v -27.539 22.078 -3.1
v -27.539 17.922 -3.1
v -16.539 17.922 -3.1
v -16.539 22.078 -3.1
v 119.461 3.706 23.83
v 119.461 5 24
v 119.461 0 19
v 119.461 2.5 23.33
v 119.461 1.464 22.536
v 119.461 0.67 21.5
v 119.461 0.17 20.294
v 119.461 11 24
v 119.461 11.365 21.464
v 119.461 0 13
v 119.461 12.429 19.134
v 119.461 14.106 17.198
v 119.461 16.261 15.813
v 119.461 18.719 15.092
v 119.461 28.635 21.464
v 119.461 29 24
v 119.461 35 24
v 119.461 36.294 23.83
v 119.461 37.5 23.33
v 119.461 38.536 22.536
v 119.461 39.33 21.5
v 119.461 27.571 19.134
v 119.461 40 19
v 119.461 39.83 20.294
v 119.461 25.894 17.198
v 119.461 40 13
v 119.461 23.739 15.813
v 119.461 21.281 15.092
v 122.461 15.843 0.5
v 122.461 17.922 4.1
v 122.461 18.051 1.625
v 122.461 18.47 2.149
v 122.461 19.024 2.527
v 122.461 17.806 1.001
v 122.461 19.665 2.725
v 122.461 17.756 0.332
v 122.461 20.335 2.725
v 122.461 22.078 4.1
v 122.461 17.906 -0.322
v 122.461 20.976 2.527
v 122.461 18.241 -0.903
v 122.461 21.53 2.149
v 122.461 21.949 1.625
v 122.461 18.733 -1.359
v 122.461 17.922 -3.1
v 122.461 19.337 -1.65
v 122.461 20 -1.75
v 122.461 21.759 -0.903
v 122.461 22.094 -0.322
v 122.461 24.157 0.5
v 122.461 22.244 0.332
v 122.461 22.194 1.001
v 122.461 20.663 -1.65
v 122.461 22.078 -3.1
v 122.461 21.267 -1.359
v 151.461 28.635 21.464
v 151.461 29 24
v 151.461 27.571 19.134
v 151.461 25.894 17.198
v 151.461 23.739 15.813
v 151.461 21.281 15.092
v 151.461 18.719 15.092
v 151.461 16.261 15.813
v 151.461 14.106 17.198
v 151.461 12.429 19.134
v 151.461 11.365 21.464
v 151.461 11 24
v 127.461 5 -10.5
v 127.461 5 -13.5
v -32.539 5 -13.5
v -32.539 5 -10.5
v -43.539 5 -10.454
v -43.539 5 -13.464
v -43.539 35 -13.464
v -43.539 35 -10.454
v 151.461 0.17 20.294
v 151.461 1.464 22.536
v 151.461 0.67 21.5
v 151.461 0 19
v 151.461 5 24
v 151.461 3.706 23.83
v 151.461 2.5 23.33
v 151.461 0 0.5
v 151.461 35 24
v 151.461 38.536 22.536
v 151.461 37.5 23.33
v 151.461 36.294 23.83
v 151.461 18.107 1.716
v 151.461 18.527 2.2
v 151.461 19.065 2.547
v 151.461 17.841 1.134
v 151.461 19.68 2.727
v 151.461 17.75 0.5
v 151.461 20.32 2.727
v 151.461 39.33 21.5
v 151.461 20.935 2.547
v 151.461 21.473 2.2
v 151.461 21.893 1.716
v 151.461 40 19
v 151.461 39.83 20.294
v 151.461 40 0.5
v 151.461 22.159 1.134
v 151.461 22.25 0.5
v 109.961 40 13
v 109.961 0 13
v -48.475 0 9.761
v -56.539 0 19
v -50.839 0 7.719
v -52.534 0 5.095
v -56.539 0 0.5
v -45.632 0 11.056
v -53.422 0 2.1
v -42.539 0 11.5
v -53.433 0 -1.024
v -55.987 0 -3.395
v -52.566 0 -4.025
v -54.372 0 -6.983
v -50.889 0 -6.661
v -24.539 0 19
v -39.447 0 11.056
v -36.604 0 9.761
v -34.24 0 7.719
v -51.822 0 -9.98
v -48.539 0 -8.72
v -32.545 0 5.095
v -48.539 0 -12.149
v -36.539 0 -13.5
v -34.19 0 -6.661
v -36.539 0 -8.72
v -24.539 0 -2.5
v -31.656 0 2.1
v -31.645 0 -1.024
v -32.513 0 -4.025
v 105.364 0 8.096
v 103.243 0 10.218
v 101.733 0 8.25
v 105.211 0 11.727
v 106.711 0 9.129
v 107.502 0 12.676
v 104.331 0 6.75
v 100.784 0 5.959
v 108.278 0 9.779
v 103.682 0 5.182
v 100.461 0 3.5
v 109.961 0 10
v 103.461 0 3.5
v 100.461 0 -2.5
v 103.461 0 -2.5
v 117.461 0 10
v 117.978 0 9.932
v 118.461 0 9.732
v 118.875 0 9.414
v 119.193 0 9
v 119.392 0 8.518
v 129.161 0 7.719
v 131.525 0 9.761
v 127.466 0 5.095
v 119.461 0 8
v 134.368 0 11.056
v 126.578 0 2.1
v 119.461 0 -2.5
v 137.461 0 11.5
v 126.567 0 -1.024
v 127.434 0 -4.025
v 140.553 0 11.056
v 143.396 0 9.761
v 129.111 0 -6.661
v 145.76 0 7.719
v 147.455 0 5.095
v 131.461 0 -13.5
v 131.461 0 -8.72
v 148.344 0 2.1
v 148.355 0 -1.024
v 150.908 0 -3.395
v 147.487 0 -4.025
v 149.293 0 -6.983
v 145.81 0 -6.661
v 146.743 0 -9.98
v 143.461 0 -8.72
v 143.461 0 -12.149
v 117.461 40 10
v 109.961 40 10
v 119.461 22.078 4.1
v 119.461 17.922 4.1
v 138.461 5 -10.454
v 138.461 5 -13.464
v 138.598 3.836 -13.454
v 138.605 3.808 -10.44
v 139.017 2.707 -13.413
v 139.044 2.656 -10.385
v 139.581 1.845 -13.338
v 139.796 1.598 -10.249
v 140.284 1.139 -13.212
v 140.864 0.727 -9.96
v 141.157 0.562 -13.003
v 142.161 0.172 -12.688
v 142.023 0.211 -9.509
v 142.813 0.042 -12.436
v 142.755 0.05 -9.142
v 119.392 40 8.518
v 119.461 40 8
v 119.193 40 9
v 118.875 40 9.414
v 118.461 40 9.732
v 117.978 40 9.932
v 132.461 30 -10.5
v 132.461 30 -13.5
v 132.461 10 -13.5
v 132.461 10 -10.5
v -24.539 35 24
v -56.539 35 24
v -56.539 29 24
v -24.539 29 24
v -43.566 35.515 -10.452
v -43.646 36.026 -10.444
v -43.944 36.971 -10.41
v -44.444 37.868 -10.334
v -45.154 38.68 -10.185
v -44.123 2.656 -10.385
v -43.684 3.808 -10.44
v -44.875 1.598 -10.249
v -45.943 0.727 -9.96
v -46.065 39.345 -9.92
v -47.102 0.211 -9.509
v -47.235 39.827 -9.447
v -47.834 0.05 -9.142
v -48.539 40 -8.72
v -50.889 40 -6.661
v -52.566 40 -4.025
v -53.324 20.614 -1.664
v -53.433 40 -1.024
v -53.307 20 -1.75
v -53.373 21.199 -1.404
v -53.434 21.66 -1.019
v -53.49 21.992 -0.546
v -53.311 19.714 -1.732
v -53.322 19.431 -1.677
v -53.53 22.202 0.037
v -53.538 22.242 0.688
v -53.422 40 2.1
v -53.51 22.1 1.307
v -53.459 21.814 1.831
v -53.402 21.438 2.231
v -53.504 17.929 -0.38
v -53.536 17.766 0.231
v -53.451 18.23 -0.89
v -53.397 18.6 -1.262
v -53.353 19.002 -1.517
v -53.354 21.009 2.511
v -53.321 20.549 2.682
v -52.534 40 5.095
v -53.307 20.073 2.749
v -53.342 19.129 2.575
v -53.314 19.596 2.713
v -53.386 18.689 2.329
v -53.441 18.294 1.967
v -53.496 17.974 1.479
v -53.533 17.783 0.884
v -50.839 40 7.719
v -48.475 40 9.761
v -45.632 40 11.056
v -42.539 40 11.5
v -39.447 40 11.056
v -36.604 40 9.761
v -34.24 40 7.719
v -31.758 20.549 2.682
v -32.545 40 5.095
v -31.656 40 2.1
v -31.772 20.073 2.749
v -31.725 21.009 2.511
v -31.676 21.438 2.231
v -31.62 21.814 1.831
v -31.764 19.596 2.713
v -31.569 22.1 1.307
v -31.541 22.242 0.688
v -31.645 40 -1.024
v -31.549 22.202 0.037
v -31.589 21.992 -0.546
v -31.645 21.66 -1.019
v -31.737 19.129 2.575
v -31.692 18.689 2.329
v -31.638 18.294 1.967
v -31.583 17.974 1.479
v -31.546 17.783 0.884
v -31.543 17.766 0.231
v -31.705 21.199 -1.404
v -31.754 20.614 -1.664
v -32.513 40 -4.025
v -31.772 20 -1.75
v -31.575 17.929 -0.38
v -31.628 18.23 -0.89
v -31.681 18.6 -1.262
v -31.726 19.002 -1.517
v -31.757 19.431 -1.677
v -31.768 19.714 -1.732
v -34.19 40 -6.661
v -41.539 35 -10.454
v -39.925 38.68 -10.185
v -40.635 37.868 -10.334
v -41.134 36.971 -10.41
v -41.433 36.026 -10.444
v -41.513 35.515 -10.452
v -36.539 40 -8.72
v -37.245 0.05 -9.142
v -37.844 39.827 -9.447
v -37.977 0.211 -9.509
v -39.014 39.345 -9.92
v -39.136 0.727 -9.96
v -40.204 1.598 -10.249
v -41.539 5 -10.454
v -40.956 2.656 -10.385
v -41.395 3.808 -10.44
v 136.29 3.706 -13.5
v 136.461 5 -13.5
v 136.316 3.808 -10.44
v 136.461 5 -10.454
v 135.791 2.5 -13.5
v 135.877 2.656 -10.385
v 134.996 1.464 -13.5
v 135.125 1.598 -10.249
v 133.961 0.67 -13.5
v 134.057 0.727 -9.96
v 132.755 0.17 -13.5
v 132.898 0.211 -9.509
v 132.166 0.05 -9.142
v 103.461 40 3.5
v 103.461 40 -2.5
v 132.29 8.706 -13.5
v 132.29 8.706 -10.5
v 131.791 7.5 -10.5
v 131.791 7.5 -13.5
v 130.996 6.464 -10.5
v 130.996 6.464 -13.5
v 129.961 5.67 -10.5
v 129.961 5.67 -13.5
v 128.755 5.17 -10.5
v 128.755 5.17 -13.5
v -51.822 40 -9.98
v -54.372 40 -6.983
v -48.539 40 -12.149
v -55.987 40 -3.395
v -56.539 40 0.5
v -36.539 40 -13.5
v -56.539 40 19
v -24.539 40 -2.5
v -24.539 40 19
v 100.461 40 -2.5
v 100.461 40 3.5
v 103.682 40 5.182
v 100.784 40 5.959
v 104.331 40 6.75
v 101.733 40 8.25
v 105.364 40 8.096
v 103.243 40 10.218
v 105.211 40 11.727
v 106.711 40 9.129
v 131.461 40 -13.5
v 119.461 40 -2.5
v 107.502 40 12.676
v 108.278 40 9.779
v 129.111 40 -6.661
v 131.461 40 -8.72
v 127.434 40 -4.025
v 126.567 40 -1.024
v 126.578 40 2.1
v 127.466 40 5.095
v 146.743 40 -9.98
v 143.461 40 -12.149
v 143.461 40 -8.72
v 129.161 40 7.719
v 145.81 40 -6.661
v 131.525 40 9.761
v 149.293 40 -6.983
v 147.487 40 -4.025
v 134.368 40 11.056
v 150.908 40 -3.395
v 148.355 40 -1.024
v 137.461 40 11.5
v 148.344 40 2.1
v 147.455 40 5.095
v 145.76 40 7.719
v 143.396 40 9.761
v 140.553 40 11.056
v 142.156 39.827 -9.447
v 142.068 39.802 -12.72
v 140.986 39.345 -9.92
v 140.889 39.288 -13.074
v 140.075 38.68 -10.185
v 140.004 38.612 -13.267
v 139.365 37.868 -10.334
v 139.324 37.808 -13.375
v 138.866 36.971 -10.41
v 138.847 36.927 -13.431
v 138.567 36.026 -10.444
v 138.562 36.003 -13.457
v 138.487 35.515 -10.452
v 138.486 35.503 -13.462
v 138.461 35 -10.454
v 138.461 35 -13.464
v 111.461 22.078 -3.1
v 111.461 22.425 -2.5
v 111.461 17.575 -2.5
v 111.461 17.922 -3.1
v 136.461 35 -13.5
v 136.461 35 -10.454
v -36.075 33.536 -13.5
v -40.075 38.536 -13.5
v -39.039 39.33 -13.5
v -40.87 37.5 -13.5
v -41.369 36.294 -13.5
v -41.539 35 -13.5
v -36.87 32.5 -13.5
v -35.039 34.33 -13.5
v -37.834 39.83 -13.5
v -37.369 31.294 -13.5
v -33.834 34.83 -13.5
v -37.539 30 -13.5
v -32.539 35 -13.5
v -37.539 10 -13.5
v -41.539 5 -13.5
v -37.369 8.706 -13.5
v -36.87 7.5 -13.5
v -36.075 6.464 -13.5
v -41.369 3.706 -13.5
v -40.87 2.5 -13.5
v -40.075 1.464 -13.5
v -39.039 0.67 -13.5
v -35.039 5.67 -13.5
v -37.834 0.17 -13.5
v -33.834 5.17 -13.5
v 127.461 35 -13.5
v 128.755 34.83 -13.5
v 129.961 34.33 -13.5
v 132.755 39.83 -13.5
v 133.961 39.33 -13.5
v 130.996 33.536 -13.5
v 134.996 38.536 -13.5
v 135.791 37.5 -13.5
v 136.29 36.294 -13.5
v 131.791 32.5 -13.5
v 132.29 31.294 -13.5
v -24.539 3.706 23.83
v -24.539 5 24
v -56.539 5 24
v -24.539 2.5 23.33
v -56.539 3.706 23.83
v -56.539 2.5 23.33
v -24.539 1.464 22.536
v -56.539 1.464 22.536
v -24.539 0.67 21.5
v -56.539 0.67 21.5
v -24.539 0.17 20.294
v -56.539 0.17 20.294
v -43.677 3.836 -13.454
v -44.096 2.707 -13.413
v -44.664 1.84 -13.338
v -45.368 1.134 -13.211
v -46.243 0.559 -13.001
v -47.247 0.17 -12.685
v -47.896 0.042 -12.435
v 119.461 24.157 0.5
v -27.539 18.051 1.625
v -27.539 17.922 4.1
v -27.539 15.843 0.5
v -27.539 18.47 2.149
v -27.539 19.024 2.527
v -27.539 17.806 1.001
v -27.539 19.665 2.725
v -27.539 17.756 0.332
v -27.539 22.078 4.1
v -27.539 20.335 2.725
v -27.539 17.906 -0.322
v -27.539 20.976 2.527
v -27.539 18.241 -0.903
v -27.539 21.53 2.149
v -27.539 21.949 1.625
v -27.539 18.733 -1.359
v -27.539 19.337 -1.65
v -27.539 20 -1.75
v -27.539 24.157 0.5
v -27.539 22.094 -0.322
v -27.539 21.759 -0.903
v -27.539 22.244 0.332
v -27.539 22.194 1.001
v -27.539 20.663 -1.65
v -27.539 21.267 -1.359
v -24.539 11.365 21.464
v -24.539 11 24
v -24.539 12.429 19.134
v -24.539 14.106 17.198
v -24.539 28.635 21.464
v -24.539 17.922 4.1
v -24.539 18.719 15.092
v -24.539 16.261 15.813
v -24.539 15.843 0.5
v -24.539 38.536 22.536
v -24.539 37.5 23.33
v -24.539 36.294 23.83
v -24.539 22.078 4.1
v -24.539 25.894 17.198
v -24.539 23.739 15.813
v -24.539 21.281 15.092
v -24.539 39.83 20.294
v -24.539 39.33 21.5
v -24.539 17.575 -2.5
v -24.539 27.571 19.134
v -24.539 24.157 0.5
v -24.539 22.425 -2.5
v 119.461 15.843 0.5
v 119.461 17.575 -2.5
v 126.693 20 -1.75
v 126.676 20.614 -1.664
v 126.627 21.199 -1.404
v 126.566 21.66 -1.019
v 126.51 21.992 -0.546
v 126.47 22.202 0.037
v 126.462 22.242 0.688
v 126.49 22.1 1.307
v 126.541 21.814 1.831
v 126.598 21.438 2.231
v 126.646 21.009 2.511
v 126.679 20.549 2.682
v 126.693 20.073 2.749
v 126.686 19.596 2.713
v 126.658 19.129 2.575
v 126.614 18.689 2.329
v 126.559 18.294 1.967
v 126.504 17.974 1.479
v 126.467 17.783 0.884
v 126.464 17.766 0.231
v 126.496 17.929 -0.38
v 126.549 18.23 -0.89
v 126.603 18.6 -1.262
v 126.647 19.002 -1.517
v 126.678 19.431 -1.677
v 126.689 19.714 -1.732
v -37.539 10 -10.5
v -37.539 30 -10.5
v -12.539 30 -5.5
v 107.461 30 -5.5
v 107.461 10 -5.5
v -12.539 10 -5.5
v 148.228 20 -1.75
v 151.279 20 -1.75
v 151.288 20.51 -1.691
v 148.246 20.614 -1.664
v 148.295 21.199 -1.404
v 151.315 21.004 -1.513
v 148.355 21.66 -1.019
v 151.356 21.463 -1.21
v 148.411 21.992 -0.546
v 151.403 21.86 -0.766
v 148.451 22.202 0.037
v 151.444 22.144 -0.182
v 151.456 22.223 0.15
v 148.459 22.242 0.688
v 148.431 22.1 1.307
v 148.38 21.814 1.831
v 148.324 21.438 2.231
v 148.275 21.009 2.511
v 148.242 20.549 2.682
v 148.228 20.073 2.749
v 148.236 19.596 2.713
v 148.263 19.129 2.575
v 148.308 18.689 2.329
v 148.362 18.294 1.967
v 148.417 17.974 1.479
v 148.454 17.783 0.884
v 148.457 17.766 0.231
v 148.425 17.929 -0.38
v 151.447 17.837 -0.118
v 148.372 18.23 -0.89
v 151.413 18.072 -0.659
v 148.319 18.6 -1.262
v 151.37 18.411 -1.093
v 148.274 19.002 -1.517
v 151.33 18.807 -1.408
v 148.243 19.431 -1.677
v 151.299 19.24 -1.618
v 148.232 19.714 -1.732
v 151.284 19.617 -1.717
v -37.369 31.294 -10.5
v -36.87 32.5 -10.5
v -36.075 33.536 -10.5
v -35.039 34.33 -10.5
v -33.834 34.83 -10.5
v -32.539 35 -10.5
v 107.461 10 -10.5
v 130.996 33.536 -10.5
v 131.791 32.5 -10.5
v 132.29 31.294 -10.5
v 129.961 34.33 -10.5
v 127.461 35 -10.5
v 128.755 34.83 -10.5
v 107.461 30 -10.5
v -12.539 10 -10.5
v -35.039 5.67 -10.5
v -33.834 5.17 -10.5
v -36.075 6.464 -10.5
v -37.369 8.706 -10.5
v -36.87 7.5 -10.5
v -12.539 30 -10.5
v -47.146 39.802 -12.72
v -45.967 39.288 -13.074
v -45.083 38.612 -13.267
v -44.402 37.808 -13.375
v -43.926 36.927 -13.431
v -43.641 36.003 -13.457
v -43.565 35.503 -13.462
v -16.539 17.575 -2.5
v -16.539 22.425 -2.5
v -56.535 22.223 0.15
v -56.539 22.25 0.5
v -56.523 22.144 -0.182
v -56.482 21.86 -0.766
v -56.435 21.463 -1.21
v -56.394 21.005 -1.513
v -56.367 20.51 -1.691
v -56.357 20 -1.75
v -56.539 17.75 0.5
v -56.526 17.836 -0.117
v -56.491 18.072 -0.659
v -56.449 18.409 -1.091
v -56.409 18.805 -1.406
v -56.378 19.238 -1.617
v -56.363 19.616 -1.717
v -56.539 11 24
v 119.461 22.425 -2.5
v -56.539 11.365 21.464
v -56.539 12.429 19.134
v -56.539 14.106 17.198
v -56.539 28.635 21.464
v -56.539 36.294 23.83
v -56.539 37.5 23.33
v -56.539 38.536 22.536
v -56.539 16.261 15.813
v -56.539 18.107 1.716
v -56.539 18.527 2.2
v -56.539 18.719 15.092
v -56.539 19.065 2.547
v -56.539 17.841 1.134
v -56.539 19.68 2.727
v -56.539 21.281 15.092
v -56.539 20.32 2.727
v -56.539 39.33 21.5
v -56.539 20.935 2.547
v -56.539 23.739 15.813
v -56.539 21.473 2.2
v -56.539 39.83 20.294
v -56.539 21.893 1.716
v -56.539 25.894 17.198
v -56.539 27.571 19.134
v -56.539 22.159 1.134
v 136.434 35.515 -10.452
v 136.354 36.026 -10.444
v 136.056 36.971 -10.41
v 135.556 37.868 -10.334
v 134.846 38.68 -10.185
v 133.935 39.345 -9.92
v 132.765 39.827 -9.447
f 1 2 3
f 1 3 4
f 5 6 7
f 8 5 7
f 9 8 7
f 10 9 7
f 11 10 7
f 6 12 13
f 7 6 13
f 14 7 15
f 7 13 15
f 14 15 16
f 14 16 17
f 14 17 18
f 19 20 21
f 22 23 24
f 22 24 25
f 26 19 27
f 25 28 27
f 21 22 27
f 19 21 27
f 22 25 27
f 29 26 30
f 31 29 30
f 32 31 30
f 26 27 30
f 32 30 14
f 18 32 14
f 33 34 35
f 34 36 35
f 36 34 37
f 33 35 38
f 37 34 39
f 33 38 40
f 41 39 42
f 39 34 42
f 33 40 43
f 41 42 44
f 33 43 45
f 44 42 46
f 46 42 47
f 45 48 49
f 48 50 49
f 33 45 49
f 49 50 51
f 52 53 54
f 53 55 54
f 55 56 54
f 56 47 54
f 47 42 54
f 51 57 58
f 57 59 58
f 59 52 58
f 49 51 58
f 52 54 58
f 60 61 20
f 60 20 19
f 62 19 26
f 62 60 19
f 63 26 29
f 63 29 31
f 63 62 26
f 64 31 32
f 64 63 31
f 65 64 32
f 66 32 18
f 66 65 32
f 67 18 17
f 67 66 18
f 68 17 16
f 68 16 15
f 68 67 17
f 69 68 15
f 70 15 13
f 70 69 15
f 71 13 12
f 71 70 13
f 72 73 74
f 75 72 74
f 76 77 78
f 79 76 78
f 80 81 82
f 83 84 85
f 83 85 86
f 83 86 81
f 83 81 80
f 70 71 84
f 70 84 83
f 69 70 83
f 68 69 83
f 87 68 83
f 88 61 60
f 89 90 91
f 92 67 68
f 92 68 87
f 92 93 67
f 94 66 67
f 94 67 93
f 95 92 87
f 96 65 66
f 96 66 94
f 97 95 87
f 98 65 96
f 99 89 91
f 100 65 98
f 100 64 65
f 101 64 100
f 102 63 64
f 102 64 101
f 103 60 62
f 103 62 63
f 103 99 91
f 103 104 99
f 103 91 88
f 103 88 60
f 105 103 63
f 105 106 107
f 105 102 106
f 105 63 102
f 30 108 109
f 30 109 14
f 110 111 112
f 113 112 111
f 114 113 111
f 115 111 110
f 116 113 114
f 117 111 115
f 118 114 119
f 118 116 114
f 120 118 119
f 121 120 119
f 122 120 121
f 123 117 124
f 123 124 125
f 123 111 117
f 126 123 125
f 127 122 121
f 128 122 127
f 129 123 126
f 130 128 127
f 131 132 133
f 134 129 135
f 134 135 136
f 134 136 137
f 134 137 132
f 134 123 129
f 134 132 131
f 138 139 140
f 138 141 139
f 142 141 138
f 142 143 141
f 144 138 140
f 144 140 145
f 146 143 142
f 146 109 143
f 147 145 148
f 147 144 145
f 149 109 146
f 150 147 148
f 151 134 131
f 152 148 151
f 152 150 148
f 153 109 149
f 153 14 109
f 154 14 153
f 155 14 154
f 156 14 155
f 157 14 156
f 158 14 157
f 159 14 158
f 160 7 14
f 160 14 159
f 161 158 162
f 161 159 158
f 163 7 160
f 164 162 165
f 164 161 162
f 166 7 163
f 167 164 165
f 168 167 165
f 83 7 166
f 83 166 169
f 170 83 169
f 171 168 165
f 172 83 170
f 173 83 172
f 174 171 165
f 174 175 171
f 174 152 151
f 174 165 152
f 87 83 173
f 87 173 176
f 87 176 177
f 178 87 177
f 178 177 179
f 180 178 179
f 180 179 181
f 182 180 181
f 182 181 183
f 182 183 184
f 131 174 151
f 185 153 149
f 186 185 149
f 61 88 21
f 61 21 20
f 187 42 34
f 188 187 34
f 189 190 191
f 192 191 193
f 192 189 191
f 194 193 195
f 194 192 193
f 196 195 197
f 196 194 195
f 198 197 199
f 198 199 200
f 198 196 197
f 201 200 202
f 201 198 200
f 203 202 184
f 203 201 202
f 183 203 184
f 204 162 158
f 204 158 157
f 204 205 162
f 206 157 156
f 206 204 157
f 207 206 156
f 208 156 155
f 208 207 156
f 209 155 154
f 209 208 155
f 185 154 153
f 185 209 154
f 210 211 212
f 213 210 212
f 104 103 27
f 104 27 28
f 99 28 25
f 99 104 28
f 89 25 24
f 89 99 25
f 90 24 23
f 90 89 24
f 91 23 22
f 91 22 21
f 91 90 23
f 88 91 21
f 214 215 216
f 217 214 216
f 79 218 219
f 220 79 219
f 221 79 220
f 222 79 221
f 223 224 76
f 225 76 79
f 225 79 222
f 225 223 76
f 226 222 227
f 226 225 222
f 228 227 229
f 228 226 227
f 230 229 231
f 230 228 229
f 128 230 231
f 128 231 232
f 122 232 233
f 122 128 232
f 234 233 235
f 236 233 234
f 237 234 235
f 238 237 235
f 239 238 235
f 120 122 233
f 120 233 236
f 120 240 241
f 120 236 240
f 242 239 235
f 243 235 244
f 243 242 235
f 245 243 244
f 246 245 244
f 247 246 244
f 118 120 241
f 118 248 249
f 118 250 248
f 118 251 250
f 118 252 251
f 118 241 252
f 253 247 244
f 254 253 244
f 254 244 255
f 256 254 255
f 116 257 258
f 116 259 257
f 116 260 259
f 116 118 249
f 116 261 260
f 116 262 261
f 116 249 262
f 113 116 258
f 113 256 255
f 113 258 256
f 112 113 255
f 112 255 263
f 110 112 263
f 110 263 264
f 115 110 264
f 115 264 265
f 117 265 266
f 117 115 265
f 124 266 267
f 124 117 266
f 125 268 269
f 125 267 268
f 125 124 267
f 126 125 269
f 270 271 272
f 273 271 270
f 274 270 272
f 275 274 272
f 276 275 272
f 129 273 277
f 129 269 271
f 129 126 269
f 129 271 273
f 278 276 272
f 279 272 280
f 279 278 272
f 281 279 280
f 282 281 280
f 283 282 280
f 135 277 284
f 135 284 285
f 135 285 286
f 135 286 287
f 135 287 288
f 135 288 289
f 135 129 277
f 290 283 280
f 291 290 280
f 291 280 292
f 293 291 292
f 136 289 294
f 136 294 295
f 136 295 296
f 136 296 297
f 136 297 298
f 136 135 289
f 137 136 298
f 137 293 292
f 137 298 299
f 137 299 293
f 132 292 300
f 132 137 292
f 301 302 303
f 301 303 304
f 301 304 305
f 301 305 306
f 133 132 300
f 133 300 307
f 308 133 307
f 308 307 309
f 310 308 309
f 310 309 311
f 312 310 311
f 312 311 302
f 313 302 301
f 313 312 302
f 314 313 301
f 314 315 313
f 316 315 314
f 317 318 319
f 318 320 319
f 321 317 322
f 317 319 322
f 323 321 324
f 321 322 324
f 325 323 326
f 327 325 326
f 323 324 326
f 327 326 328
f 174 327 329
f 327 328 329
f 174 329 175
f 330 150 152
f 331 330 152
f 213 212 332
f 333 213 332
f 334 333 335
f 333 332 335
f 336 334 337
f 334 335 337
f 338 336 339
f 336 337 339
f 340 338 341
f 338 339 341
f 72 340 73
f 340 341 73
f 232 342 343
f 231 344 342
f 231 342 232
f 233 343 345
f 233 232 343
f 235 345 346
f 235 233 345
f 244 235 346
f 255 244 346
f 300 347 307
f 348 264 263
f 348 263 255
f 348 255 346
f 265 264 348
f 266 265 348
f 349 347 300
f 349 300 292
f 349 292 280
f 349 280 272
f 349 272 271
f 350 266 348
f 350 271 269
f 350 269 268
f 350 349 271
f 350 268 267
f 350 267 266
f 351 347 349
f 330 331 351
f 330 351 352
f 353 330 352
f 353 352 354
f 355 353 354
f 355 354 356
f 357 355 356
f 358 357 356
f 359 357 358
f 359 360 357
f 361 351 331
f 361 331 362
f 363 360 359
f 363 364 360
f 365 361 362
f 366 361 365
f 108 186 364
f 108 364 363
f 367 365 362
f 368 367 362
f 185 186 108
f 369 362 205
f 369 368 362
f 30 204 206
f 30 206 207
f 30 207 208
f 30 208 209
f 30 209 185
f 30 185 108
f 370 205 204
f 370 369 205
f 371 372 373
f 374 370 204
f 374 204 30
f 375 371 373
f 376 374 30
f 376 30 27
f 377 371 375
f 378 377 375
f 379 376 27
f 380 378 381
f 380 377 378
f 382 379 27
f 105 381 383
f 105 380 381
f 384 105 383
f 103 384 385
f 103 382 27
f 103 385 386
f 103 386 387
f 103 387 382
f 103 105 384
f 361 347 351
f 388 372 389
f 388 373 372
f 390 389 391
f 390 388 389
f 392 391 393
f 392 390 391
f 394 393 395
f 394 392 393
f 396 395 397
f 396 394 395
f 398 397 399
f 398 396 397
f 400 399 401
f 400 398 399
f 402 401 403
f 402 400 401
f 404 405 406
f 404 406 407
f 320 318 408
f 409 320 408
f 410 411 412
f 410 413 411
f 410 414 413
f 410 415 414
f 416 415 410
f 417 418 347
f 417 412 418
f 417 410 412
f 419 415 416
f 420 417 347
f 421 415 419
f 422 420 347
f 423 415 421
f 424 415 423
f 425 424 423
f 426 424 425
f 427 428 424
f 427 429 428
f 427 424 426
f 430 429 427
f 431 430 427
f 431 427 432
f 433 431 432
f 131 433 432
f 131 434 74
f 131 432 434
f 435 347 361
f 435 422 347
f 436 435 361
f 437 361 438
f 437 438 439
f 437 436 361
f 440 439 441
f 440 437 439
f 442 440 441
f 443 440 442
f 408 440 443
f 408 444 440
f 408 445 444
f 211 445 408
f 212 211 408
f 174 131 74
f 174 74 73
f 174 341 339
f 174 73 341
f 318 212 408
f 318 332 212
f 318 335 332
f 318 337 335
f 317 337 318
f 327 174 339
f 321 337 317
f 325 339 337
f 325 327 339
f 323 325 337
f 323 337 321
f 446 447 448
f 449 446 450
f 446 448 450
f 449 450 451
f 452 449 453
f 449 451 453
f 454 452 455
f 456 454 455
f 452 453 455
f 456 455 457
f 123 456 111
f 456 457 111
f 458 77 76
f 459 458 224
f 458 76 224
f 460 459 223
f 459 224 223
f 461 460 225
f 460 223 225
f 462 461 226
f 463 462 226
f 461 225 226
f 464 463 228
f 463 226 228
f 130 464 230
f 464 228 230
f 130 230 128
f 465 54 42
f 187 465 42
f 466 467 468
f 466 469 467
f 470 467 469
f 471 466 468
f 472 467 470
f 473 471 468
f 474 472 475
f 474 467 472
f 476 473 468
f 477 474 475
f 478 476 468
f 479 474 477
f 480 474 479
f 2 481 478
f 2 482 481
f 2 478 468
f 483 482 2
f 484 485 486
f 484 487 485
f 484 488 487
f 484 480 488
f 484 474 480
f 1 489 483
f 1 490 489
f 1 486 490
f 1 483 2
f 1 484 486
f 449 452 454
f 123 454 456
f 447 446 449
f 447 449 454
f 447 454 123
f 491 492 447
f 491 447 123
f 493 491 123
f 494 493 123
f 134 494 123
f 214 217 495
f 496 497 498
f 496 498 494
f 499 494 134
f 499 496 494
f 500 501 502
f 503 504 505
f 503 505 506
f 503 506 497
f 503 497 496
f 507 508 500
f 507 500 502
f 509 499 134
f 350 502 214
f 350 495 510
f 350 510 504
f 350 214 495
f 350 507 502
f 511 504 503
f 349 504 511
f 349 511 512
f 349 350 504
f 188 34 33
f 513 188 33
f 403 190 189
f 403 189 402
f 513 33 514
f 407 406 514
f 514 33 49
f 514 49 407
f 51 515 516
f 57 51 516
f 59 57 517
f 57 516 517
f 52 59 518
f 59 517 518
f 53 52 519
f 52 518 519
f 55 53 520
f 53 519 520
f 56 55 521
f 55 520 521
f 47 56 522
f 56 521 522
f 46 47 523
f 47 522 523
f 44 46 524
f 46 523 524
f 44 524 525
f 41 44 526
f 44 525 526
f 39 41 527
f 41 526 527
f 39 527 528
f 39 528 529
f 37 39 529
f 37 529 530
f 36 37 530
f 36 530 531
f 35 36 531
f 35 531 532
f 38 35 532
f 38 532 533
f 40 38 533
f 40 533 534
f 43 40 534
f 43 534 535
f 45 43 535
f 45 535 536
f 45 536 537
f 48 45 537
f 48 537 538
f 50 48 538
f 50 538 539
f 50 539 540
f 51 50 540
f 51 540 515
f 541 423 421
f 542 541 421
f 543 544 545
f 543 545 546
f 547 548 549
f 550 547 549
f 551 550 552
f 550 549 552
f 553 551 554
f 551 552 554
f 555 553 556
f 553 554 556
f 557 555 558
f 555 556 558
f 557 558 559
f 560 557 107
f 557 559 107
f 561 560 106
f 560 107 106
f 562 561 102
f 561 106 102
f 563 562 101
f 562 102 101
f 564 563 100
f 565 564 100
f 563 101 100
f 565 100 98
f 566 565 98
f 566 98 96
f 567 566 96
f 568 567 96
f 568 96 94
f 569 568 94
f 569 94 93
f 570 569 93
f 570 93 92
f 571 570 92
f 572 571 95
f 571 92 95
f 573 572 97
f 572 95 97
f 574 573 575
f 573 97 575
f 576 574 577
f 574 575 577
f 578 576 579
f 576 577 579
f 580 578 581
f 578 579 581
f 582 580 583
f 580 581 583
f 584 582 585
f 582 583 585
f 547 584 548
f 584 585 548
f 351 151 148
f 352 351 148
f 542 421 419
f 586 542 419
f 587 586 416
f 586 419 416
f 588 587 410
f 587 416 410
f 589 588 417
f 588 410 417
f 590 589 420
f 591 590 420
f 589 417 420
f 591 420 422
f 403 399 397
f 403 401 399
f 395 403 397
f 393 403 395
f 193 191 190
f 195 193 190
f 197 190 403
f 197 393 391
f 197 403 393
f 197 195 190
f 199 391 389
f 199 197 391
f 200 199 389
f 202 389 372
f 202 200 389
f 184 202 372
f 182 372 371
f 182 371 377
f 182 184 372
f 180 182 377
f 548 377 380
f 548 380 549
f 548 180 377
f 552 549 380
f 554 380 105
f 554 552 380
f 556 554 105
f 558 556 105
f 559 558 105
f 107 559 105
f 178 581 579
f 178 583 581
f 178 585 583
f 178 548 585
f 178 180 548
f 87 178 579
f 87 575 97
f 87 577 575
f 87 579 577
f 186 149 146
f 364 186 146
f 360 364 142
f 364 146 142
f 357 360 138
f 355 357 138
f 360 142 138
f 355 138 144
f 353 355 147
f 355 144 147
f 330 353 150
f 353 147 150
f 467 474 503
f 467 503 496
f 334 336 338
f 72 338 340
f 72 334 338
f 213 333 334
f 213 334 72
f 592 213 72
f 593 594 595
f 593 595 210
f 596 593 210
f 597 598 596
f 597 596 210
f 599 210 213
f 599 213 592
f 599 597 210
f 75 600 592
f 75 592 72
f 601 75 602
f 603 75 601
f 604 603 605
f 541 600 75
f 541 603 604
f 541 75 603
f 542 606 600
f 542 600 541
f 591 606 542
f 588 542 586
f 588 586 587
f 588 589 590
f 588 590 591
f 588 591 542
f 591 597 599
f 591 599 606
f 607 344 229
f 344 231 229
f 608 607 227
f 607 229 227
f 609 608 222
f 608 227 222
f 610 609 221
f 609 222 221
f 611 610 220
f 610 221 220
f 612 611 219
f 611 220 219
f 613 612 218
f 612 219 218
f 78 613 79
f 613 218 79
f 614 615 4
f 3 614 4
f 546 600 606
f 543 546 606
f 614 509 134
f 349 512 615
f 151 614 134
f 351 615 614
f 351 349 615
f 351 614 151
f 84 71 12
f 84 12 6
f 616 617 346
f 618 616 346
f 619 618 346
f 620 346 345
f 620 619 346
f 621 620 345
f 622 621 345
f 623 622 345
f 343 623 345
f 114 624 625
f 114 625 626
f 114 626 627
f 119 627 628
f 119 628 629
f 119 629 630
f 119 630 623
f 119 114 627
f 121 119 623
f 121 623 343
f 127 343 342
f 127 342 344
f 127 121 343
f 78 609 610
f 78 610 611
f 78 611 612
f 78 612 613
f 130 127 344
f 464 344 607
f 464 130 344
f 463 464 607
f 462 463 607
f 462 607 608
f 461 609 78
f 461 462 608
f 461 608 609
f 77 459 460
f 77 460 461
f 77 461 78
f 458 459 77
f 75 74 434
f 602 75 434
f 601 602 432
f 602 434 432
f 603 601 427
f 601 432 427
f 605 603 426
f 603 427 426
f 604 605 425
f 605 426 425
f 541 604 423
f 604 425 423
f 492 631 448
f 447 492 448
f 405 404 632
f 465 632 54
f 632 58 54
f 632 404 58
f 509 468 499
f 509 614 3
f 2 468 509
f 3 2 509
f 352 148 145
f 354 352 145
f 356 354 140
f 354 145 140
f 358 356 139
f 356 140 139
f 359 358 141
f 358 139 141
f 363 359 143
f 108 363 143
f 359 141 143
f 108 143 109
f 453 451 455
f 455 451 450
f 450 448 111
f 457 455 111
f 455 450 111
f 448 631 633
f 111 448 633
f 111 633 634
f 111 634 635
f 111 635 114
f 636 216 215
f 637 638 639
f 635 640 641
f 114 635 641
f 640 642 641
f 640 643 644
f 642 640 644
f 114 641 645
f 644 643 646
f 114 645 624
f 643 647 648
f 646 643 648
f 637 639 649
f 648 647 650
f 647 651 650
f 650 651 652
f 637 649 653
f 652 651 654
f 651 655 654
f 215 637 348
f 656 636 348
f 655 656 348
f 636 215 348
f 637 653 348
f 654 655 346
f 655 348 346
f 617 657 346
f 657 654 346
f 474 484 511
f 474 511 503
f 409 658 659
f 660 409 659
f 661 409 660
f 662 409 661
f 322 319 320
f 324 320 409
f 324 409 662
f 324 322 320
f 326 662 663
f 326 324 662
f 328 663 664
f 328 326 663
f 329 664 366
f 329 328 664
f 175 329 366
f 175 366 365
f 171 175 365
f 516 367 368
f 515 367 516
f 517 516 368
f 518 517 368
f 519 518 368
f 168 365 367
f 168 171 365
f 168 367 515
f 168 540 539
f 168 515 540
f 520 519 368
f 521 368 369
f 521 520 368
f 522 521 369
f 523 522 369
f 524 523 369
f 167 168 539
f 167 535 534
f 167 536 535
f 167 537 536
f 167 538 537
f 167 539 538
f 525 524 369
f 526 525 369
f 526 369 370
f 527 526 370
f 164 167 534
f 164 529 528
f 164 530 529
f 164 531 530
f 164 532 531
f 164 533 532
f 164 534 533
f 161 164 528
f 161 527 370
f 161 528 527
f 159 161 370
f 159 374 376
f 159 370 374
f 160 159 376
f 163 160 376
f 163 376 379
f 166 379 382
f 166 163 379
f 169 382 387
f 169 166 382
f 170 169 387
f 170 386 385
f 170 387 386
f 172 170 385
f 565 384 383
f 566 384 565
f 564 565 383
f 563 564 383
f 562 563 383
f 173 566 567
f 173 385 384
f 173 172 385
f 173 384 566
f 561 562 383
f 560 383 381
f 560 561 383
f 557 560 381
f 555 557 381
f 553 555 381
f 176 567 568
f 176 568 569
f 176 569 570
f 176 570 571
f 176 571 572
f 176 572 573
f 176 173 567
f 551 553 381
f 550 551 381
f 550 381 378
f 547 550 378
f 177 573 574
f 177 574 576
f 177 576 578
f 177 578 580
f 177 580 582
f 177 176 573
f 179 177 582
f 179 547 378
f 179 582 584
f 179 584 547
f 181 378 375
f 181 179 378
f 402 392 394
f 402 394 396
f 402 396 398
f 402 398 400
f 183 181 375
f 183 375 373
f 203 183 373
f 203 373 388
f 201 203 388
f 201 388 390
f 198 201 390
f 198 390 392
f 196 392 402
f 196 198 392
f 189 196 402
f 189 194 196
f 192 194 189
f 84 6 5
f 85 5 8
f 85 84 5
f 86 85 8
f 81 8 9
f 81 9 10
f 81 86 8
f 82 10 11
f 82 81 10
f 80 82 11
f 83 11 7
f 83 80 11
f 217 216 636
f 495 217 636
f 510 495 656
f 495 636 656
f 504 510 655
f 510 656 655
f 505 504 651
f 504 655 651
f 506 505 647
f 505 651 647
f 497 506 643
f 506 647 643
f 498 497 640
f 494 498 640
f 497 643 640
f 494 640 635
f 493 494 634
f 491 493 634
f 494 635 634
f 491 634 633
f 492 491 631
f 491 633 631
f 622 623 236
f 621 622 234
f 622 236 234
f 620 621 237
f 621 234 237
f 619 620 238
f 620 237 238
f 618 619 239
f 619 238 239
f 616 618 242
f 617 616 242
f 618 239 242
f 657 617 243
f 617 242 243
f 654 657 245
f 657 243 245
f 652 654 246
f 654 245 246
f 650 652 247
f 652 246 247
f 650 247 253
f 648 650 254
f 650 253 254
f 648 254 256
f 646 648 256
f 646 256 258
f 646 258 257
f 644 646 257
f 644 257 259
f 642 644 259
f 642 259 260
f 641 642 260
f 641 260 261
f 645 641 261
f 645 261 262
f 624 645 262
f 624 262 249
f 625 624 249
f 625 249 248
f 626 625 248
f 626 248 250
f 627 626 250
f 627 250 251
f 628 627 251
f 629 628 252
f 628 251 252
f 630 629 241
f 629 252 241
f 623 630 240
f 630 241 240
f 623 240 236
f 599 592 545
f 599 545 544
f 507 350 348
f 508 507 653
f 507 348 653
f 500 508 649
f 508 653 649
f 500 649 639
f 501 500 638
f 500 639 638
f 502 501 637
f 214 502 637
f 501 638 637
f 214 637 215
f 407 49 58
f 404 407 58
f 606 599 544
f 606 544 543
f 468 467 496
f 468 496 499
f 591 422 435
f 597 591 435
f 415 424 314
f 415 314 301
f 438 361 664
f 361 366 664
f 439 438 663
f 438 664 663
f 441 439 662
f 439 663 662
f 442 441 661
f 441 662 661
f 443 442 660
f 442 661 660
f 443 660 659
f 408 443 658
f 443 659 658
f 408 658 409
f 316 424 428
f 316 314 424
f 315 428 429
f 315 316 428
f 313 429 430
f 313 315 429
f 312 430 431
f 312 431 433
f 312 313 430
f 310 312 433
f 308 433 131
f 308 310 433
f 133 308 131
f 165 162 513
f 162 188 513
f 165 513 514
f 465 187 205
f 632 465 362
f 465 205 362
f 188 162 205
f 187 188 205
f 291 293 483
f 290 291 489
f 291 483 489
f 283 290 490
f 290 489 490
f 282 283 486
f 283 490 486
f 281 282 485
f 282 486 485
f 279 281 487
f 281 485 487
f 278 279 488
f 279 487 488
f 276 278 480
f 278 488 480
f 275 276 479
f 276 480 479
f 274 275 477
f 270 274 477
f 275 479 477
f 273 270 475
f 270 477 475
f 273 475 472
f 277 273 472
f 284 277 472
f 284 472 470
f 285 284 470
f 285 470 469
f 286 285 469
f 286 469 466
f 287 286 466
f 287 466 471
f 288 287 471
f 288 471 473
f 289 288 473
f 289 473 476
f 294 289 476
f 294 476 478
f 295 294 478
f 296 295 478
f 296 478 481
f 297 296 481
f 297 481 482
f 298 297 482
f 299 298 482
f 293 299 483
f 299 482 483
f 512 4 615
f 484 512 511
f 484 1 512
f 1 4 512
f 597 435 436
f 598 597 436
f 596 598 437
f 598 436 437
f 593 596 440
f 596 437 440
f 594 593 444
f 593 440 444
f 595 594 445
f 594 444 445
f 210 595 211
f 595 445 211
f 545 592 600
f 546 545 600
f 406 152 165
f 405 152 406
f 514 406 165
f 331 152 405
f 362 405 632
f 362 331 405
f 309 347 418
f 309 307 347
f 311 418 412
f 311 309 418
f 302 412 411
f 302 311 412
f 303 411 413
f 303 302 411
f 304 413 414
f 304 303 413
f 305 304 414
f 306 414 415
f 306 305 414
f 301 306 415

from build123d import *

# Parameters (mm, degrees)
SKETCH1_R               = 11
BOSS_EXTRUDE1_DEPTH     = 40
BOSS_EXTRUDE2_DEPTH     = 32
SKETCH4_W               = 144
SKETCH4_H               = 40
BOSS_EXTRUDE4_DEPTH     = 5
BOSS_EXTRUDE5_DEPTH     = 32
CUT_EXTRUDE2_DEPTH      = 3
SKETCH6_W               = 120
SKETCH6_H               = 20
CUT_EXTRUDE3_DEPTH      = 5
SKETCH8_W               = 2
SKETCH8_H               = 40
CUT_EXTRUDE_THIN1_DEPTH = 18
FILLET2_R               = 5
SKETCH9_R               = 2.25
CUT_EXTRUDE4_DEPTH      = 226
CUT_EXTRUDE5_START      = -3
CUT_EXTRUDE5_DEPTH      = 11
BOSS_EXTRUDE6_DEPTH     = 40
FILLET3_R               = 2


with BuildPart() as part:
    # Sketch1 → Boss-Extrude1 (new body)
    with BuildSketch(Plane(origin=(0, 0, 0), x_dir=(1, 0, 0), z_dir=(0, 1, 0))):
        with BuildLine():
            Line((137.460581558, -14.5), (119.460581558, -14.5))
            Line((119.460581558, -14.5), (119.460581558, 7.5))
            Line((119.460581558, 7.5), (-24.539418442, 7.5))
            Line((-24.539418442, 7.5), (-24.539418442, -14.5))
            Line((-24.539418442, -14.5), (-42.539418442, -14.5))
            Line((-42.539418442, -14.5), (-56.539418442, -14.5))
            Line((-56.539418442, -14.5), (-56.539418442, -0.5))
            ThreePointArc((-56.539418442, -0.5), (-52.438913379, 9.399494937), (-42.539418442, 13.5))
            Line((-42.539418442, 13.5), (137.460581558, 13.5))
            ThreePointArc((137.460581558, 13.5), (147.360076494, 9.399494937), (151.460581558, -0.5))
            Line((151.460581558, -0.5), (151.460581558, -14.5))
            Line((151.460581558, -14.5), (137.460581558, -14.5))
        make_face()
        with Locations((-42.539418442, -0.5)):
            Circle(SKETCH1_R, mode=Mode.SUBTRACT)
        with Locations((137.460581558, -0.5)):
            Circle(SKETCH1_R, mode=Mode.SUBTRACT)
    extrude(amount=BOSS_EXTRUDE1_DEPTH)

    # Sketch2 → Boss-Extrude2 (add)
    with BuildSketch(Plane.ZY.offset(56.539418442)):
        with BuildLine():
            Line((14.5, 40), (19, 40))
            ThreePointArc((19, 40), (22.535533906, 38.535533906), (24, 35))
            Line((24, 35), (24, 29))
            ThreePointArc((24, 29), (15, 20), (24, 11))
            Line((24, 11), (24, 5))
            ThreePointArc((24, 5), (22.535533906, 1.464466094), (19, 0))
            Line((19, 0), (14.5, 0))
            Line((14.5, 0), (14.5, 40))
        make_face()
    extrude(amount=-BOSS_EXTRUDE2_DEPTH)

    # Sketch4 → Boss-Extrude4 (add)
    with BuildSketch(Plane.XY.offset(-7.5)):
        with Locations((47.460581558, 20)):
            Rectangle(SKETCH4_W, SKETCH4_H)
    extrude(amount=BOSS_EXTRUDE4_DEPTH)

    # Sketch3 → Boss-Extrude5 (add)
    with BuildSketch(Plane(origin=(151.460581558, 0, 0), x_dir=(0, 0, -1), z_dir=(1, 0, 0))):
        with BuildLine():
            Line((-24, 11), (-24, 5))
            ThreePointArc((-24, 5), (-22.535533906, 1.464466094), (-19, 0))
            Line((-19, 0), (-14.5, 0))
            Line((-14.5, 0), (-14.5, 40))
            Line((-14.5, 40), (-19, 40))
            ThreePointArc((-19, 40), (-22.535533906, 38.535533906), (-24, 35))
            Line((-24, 35), (-24, 29))
            ThreePointArc((-24, 29), (-15, 20), (-24, 11))
        make_face()
    extrude(amount=-BOSS_EXTRUDE5_DEPTH)

    # Sketch5 → Cut-Extrude2 (cut)
    with BuildSketch(Plane(origin=(0, 0, -13.5), x_dir=(-1, 0, 0), z_dir=(0, 0, -1))):
        with BuildLine():
            Line((32.539418442, 35), (-127.460581558, 35))
            ThreePointArc((-127.460581558, 35), (-130.996115464, 33.535533906), (-132.460581558, 30))
            Line((-132.460581558, 30), (-132.460581558, 10))
            ThreePointArc((-132.460581558, 10), (-130.996115464, 6.464466094), (-127.460581558, 5))
            Line((-127.460581558, 5), (32.539418442, 5))
            ThreePointArc((32.539418442, 5), (36.074952348, 6.464466094), (37.539418442, 10))
            Line((37.539418442, 10), (37.539418442, 30))
            ThreePointArc((37.539418442, 30), (36.074952348, 33.535533906), (32.539418442, 35))
        make_face()
    extrude(amount=-CUT_EXTRUDE2_DEPTH, mode=Mode.SUBTRACT)

    # Sketch6 → Cut-Extrude3 (cut)
    with BuildSketch(Plane(origin=(0, 0, -10.5), x_dir=(-1, 0, 0), z_dir=(0, 0, -1))):
        with Locations((-47.460581558, 20)):
            Rectangle(SKETCH6_W, SKETCH6_H)
    extrude(amount=-CUT_EXTRUDE3_DEPTH, mode=Mode.SUBTRACT)

    # Sketch8 → Cut-Extrude-Thin1 (cut)
    with BuildSketch(Plane(origin=(0, 0, -13.5), x_dir=(-1, 0, 0), z_dir=(0, 0, -1))):
        with Locations((-137.460581558, 20)):
            Rectangle(SKETCH8_W, SKETCH8_H)
        with Locations((42.539418442, 20)):
            Rectangle(SKETCH8_W, SKETCH8_H)
    extrude(amount=-CUT_EXTRUDE_THIN1_DEPTH, mode=Mode.SUBTRACT)

    # Fillet2
    fillet2_edges = [part.edges().sort_by_distance(p)[0] for p in [
        (138.460581558, 0, -11.959345597),
        (138.460581558, 40, -11.959345597),
        (136.460581558, 0, -11.977225575),
        (136.460581558, 40, -11.977225575),
        (-41.539418442, 40, -11.977225575),
        (-43.539418442, 40, -11.959345597),
        (-43.539418442, 0, -11.959345597),
        (-41.539418442, 0, -11.977225575),
    ]]
    fillet(fillet2_edges, radius=FILLET2_R)

    # Sketch9 → Cut-Extrude4 (cut)
    with BuildSketch(Plane(origin=(151.460581558, 0, 0), x_dir=(0, 0, -1), z_dir=(1, 0, 0))):
        with Locations((-0.5, 20)):
            Circle(SKETCH9_R)
    extrude(amount=-CUT_EXTRUDE4_DEPTH, mode=Mode.SUBTRACT)

    # Sketch10 → Cut-Extrude5 (cut)
    with BuildSketch(Plane(origin=(-24.539418442, 0, 0), x_dir=(0, 0, -1), z_dir=(1, 0, 0)).offset(CUT_EXTRUDE5_START)):
        Polygon((-0.5, 24.156921938), (-4.1, 22.078460969), (-4.1, 17.921539031), (-0.5, 15.843078062), (3.1, 17.921539031), (3.1, 22.078460969), align=None)
    cut_extrude5 = extrude(amount=CUT_EXTRUDE5_DEPTH, mode=Mode.SUBTRACT)

    # Mirror5: Cut-Extrude5 across plane
    add(cut_extrude5.mirror(Plane.ZY.offset(-47.460581558)), mode=Mode.SUBTRACT)

    # Sketch12 → Boss-Extrude6 (add)
    with BuildSketch(Plane(origin=(0, 0, 0), x_dir=(-1, 0, 0), z_dir=(0, -1, 0))):
        with BuildLine():
            Line((-103.460581558, -3.5), (-103.460581558, 2.5))
            Line((-103.460581558, 2.5), (-100.460581558, 2.5))
            Line((-100.460581558, 2.5), (-100.460581558, -3.5))
            ThreePointArc((-100.460581558, -3.5), (-103.243067136, -10.217514421), (-109.960581558, -13))
            Line((-109.960581558, -13), (-119.460581558, -13))
            Line((-119.460581558, -13), (-119.460581558, -10))
            Line((-119.460581558, -10), (-116.460581558, -10))
            Line((-116.460581558, -10), (-109.960581558, -10))
            ThreePointArc((-109.960581558, -10), (-105.36438748, -8.096194078), (-103.460581558, -3.5))
        make_face()
    extrude(amount=-BOSS_EXTRUDE6_DEPTH)

    # Fillet3
    fillet3_edges = [part.edges().sort_by_distance(p)[0] for p in [
        (119.460581558, 20, 10),
    ]]
    fillet(fillet3_edges, radius=FILLET3_R)


solid = part.part
